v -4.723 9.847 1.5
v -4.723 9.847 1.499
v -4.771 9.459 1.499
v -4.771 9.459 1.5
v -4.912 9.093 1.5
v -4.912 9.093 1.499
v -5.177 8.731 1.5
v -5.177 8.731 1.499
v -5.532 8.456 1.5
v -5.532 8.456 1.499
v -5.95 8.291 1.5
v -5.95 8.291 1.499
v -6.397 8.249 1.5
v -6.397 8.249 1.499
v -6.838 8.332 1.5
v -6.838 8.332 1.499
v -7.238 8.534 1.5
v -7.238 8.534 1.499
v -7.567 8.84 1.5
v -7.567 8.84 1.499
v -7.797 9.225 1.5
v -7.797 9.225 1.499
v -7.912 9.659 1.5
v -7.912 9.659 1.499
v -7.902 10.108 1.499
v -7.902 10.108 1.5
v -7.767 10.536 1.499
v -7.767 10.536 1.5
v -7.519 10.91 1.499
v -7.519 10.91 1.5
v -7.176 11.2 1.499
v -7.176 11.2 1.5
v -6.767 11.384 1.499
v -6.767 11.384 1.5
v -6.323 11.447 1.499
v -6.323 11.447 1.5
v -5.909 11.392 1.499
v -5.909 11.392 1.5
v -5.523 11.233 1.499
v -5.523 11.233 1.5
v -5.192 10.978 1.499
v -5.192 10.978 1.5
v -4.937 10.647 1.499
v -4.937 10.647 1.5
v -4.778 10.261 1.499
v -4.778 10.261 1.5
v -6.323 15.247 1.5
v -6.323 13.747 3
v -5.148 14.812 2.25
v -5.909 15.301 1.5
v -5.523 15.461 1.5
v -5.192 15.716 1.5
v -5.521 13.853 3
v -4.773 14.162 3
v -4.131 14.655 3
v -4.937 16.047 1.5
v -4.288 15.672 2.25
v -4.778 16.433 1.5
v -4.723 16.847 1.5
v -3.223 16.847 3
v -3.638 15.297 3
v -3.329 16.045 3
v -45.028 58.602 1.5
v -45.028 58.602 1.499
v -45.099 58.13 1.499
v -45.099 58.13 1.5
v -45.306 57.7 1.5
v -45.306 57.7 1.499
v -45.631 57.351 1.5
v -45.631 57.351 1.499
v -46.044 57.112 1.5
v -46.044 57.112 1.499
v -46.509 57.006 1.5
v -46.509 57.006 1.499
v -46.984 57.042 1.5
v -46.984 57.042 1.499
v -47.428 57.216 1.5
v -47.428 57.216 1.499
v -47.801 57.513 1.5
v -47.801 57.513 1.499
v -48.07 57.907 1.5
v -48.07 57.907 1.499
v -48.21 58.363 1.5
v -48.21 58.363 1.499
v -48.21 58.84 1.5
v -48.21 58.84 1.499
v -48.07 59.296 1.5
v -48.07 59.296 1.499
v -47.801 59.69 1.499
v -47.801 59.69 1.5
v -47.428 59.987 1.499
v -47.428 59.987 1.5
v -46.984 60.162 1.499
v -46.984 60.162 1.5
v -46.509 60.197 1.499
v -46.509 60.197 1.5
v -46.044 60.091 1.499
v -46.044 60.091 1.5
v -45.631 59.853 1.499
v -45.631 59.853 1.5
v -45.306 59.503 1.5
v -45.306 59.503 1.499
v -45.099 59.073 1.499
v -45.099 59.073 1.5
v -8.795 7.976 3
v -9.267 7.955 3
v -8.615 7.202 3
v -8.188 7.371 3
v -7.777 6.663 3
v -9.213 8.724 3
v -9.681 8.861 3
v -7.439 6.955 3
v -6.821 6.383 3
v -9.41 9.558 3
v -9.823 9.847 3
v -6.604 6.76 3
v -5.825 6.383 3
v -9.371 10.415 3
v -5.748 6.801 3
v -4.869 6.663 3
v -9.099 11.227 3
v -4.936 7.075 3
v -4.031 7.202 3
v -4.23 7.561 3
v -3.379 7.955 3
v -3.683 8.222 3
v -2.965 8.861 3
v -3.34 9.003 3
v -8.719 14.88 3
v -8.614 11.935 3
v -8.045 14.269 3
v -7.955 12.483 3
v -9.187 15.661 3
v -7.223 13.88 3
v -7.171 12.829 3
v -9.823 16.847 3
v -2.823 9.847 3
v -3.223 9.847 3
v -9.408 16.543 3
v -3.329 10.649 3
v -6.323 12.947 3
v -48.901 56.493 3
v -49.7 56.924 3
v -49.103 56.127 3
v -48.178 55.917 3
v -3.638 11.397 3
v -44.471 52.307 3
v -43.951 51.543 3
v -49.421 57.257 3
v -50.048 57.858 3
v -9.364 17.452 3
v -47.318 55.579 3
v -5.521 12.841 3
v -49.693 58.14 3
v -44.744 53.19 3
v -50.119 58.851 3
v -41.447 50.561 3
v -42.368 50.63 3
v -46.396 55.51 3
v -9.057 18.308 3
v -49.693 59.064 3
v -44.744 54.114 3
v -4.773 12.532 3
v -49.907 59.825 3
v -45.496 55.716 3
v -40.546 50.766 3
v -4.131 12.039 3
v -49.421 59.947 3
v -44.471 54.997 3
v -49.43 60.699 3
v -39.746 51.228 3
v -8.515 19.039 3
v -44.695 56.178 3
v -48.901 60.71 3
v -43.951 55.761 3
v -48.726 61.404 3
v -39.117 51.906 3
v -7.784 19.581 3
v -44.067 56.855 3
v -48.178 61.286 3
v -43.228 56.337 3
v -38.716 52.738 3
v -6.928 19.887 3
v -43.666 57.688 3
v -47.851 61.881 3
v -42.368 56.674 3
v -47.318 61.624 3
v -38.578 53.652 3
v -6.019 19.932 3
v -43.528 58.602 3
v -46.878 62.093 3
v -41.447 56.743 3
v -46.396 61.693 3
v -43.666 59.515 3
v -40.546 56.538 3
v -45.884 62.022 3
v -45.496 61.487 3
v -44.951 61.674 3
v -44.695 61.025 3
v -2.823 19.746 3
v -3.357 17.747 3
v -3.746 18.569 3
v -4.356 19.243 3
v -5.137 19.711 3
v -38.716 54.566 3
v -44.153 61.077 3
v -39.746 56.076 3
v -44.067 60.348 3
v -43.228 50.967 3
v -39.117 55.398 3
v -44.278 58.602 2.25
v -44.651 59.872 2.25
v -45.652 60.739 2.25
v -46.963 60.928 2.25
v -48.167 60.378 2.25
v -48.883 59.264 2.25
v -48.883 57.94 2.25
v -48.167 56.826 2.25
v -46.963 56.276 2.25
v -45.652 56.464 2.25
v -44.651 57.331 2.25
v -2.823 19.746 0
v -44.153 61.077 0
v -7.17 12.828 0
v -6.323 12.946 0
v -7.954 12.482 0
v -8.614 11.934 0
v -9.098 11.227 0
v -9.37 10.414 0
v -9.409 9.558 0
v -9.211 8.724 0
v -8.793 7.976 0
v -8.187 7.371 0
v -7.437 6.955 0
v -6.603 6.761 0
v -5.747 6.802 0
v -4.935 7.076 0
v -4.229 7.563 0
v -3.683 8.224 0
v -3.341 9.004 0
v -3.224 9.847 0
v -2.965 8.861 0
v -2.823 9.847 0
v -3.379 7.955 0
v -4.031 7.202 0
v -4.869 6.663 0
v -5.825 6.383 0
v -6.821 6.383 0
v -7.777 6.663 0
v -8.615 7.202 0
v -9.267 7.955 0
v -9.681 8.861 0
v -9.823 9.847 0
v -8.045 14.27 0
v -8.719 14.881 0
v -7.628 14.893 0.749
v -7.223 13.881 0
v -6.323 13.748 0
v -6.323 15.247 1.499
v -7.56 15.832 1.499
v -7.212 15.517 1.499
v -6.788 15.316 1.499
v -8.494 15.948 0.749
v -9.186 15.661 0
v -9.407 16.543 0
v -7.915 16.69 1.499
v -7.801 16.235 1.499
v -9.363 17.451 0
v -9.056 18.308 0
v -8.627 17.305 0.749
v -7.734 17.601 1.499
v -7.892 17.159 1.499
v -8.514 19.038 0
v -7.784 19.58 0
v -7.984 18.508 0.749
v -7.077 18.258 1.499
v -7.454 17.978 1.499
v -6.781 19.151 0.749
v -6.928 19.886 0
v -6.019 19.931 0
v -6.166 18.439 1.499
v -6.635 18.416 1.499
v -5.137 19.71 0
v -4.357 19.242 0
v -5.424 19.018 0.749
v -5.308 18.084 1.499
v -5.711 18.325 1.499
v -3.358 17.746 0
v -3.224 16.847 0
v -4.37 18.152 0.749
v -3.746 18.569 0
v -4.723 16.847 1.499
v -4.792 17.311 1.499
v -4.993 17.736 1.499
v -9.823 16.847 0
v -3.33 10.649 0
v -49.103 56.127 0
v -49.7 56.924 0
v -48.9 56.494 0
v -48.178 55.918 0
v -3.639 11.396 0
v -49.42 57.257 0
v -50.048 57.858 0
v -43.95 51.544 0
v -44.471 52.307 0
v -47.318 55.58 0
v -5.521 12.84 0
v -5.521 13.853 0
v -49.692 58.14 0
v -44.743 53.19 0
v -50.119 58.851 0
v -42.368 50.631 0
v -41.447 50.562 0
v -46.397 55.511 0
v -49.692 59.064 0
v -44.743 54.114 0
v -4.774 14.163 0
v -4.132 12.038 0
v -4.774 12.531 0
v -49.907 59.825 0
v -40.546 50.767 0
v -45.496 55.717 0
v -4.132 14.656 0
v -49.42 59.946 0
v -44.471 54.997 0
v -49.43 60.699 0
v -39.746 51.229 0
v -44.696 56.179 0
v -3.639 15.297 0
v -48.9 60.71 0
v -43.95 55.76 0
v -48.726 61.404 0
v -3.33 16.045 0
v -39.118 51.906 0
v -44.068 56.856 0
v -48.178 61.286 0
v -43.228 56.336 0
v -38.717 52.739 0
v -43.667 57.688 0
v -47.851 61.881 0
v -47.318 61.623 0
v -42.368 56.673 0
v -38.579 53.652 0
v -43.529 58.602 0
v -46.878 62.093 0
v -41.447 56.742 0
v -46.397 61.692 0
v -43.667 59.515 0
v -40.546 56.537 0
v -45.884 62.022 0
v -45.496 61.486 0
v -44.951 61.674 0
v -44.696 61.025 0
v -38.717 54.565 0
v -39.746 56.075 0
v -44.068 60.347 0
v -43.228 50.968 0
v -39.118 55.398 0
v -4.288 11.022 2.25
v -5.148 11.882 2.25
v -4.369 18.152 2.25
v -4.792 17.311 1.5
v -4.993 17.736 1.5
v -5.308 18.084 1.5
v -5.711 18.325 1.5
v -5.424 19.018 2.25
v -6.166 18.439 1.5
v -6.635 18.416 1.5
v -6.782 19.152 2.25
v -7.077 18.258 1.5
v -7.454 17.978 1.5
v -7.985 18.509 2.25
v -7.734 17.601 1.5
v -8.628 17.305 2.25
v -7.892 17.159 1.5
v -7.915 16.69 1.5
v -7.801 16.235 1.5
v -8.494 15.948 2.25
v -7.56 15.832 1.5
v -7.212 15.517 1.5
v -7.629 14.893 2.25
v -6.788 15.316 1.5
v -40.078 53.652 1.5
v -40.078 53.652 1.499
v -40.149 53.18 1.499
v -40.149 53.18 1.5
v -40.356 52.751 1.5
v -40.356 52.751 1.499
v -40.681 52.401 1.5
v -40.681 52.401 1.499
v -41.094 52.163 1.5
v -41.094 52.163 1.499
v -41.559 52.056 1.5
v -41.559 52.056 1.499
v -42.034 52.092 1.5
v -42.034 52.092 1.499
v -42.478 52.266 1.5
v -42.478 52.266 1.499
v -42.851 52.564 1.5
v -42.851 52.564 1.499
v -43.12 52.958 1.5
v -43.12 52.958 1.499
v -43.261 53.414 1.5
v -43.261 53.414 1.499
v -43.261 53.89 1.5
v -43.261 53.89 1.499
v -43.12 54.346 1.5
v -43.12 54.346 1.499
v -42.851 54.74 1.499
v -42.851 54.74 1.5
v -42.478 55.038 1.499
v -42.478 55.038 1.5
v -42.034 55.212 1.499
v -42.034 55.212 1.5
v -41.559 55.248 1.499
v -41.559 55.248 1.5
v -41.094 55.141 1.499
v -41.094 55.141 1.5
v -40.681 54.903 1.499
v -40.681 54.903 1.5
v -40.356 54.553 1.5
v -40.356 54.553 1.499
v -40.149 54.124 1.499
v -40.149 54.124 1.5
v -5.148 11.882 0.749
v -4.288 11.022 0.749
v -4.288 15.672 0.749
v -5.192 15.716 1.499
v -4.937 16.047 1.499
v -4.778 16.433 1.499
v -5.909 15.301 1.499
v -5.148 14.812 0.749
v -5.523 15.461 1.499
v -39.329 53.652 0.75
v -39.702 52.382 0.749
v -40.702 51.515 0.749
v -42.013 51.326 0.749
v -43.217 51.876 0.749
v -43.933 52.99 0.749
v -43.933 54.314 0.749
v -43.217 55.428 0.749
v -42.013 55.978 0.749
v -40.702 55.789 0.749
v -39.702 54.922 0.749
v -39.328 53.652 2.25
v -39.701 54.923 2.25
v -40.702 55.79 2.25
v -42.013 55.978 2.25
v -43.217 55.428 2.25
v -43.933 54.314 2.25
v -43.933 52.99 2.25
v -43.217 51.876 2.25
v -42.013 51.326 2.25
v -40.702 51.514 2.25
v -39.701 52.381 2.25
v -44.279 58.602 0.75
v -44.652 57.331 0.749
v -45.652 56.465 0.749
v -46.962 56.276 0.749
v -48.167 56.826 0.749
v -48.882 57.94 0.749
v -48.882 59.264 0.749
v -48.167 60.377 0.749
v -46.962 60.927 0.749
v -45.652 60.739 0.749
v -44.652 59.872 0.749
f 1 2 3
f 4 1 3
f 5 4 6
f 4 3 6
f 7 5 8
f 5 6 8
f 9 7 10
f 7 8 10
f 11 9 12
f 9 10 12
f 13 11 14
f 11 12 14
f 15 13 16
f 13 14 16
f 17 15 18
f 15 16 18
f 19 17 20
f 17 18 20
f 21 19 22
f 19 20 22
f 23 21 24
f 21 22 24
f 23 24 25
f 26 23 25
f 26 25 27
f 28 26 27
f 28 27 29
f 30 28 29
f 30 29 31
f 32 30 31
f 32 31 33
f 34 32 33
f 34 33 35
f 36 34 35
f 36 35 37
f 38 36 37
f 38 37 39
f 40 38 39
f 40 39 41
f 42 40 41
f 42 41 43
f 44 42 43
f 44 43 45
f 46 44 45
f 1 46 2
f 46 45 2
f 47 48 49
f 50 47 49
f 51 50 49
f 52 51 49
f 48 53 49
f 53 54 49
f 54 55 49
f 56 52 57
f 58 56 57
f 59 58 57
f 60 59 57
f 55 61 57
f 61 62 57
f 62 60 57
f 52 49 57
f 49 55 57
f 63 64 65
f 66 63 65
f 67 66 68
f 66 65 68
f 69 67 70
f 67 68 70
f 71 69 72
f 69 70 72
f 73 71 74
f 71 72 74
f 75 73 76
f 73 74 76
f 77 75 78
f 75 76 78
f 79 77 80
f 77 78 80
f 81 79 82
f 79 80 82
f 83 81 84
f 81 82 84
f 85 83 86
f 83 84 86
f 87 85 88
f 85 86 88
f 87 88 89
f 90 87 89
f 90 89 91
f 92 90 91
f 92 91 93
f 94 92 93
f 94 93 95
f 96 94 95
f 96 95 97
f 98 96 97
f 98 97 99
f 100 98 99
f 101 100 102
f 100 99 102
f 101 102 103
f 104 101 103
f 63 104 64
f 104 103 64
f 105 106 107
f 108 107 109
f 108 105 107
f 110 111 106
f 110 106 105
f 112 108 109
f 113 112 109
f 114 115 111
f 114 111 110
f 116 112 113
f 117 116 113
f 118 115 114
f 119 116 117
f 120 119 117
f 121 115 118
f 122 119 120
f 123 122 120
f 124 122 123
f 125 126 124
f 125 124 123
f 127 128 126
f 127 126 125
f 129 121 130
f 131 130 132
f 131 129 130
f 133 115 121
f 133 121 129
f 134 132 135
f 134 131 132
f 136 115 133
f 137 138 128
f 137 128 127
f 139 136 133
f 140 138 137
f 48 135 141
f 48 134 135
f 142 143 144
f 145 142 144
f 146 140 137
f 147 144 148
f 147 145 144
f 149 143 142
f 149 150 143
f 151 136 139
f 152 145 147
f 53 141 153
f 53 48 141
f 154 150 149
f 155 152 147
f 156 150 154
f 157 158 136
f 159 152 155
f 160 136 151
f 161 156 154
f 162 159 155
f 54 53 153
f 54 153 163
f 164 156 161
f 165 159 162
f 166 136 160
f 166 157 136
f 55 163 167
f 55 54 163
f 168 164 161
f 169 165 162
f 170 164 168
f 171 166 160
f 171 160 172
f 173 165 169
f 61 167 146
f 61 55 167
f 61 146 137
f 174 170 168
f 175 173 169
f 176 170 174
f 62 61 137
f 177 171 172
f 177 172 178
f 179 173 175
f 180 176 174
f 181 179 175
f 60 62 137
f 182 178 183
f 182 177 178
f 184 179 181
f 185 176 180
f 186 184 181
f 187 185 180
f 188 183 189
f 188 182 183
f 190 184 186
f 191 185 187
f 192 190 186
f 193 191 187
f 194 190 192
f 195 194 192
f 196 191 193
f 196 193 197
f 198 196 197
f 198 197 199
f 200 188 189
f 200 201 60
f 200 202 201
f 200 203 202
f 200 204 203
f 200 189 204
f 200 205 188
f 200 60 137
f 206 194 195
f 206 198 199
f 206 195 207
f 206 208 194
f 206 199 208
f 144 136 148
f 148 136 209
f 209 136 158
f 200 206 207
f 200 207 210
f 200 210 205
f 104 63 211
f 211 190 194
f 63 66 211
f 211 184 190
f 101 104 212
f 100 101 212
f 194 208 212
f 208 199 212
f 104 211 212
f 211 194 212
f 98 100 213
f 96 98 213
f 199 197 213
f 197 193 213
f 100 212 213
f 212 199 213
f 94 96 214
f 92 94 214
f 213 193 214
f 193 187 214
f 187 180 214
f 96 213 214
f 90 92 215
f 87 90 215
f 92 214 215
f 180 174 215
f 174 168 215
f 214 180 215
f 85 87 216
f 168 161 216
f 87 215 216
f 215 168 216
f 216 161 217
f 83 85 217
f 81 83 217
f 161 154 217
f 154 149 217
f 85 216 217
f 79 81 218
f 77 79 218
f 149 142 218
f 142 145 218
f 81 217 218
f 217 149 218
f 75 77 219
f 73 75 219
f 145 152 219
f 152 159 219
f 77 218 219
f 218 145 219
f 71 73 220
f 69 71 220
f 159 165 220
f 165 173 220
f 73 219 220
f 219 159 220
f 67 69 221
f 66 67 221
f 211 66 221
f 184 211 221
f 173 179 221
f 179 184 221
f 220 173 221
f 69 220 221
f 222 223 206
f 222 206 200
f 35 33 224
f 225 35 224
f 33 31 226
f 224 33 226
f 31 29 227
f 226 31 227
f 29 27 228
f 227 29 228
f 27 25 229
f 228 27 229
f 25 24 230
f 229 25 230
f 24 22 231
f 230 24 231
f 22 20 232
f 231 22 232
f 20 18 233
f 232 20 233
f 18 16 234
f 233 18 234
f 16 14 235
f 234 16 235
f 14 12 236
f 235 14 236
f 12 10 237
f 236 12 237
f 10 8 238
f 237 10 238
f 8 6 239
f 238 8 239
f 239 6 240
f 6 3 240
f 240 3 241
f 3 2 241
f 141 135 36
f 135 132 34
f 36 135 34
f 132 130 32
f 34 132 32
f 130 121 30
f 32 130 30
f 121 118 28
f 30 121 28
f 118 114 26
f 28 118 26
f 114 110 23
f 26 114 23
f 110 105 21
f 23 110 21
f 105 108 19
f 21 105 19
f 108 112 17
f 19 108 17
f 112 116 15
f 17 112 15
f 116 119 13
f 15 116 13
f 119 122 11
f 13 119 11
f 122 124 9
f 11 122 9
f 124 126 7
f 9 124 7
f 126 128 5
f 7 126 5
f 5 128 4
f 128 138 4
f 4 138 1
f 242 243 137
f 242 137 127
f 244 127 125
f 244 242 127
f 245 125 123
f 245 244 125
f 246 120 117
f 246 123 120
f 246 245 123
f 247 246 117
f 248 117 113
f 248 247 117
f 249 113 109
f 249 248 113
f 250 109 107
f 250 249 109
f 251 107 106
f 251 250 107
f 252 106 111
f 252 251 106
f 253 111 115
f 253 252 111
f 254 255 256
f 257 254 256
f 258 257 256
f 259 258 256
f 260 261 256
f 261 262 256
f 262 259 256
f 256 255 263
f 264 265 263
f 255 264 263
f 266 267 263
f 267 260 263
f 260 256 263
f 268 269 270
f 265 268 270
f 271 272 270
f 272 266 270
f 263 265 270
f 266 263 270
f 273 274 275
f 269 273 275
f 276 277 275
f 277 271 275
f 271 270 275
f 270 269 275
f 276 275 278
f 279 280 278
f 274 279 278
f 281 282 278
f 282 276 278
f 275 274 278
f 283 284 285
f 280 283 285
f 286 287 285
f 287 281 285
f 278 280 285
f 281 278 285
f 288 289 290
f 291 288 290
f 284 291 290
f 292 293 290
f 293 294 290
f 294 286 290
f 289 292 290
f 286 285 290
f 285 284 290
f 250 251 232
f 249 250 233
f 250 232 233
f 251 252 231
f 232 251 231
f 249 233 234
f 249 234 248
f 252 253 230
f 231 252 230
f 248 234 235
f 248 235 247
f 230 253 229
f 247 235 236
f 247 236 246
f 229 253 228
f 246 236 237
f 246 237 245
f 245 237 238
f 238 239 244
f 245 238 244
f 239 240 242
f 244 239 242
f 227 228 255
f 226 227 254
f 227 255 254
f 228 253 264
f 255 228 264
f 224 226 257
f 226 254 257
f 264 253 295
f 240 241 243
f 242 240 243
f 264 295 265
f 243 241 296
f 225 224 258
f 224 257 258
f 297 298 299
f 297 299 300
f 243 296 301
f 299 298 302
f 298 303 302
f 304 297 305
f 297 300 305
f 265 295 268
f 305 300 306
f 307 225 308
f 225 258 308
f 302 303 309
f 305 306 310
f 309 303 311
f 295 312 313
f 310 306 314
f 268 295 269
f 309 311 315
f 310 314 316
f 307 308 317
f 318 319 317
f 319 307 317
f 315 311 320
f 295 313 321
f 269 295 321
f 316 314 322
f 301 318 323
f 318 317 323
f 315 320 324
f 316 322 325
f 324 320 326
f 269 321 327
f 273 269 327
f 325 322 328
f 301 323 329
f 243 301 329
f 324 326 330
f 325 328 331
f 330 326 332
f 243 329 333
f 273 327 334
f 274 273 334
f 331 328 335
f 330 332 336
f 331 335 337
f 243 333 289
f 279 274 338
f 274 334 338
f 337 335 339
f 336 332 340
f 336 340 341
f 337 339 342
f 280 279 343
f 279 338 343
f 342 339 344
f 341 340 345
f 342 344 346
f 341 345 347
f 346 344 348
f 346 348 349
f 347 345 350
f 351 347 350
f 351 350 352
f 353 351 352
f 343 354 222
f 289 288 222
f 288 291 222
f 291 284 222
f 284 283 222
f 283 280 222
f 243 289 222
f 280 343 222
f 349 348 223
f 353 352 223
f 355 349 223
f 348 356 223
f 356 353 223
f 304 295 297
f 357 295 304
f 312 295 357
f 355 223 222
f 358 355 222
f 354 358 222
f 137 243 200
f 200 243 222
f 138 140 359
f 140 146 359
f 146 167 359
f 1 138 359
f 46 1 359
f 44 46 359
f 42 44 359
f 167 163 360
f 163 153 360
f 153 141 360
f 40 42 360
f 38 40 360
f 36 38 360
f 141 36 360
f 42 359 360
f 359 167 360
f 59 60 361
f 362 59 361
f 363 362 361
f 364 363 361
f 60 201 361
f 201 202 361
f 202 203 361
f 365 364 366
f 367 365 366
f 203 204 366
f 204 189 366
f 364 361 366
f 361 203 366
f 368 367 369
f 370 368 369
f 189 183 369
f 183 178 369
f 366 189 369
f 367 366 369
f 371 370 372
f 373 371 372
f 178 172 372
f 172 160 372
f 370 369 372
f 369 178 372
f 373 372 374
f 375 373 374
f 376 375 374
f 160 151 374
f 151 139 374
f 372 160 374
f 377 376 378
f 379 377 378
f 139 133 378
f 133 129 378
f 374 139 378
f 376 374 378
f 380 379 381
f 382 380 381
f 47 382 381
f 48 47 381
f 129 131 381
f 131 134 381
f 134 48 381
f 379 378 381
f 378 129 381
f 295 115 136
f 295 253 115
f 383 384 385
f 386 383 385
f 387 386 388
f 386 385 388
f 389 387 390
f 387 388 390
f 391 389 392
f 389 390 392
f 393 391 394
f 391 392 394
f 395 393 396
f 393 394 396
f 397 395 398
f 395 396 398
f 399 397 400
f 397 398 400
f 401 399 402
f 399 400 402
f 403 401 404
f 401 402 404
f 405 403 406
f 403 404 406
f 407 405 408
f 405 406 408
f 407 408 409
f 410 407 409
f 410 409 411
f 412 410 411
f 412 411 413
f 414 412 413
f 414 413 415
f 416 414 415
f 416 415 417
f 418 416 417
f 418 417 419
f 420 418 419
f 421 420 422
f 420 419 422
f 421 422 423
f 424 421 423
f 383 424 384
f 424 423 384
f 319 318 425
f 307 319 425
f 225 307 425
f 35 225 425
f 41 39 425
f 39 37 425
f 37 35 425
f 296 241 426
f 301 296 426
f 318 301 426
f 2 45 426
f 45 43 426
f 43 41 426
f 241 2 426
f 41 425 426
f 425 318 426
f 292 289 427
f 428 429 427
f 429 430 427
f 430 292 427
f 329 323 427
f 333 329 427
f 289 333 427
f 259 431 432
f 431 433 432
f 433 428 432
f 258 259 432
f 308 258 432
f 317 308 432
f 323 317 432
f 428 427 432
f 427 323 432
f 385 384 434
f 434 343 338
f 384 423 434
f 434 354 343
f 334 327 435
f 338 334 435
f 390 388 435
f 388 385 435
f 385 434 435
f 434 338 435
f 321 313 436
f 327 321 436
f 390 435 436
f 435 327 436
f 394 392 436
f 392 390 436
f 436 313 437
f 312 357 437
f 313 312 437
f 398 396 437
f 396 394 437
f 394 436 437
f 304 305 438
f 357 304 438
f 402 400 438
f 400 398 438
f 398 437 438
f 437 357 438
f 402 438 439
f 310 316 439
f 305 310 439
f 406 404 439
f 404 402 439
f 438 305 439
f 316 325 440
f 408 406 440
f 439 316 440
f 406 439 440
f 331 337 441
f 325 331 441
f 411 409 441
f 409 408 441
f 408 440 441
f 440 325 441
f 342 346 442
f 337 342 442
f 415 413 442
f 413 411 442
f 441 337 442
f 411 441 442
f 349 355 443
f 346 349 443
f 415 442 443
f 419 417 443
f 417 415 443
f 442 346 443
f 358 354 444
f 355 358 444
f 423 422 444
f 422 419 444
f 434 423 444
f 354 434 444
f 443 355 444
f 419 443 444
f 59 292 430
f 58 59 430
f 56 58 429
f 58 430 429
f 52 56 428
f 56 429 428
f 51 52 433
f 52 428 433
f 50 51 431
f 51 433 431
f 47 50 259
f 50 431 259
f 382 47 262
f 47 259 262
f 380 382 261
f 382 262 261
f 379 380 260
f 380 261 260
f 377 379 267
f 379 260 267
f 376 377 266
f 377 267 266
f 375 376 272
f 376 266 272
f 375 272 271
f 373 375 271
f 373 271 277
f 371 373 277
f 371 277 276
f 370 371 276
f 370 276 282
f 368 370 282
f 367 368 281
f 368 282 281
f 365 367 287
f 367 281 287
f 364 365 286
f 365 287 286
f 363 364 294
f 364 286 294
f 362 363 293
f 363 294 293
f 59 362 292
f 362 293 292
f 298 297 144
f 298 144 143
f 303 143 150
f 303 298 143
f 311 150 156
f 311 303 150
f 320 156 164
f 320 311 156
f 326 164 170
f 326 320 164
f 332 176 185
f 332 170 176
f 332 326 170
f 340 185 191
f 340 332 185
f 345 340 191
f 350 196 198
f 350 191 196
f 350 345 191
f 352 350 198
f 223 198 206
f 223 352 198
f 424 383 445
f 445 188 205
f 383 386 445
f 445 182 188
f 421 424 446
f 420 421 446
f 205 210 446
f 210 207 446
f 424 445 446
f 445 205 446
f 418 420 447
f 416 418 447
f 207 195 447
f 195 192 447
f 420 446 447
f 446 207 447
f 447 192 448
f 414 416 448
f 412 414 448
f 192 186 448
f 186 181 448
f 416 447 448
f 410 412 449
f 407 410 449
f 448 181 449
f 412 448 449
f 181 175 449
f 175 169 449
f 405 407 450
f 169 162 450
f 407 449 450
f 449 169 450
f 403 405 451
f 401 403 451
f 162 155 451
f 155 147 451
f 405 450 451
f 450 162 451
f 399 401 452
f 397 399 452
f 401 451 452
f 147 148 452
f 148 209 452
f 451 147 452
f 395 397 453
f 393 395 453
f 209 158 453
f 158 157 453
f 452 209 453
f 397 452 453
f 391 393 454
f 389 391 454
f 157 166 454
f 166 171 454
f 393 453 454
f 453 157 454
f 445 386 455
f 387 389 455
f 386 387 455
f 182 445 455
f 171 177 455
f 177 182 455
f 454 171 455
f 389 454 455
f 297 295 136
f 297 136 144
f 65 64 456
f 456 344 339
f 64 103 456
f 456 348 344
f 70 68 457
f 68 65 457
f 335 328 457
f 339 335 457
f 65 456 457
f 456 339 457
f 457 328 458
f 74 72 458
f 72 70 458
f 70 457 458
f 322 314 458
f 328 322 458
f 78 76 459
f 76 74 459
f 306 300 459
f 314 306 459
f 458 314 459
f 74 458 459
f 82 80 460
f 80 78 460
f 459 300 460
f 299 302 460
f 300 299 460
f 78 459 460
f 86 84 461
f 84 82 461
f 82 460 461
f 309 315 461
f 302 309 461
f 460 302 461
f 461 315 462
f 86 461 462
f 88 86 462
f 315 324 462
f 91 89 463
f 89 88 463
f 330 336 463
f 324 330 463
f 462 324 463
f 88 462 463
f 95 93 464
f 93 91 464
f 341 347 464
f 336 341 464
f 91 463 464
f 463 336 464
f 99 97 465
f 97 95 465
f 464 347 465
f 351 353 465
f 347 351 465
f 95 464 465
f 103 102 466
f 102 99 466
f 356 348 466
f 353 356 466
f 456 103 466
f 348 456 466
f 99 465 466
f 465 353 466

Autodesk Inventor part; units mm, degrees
ref_plane "YZ Plane" through (0, 0, 0) normal (1, 0, 0) x (0, 1, 0)
ref_plane "XZ Plane" through (0, 0, 0) normal (0, 1, 0) x (-1, 0, 0)
ref_plane "XY Plane" through (0, 0, 0) normal (0, 0, 1) x (1, 0, 0)
sketch "Эскиз1" plane through (0, 0, 0) normal (0, 0, 1) x (1, 0, 0)
  circle A0 centre (-6.3231, 9.8469) radius 1.6
  circle A1 centre (-6.3231, 16.8469) radius 1.6
  line L0 (-6.3231, 9.8469) -> (-6.3231, 16.8469)
  circle A2 centre (-6.3231, 16.8469) radius 3.5
  circle A3 centre (-6.3231, 9.8469) radius 3.5
  line L1 (-9.8231, 9.8469) -> (-9.8231, 16.8469)
  line L2 (-2.8231, 9.8469) -> (-2.8231, 16.8469)
  line L3 (-9.8231, 16.8469) -> (-41.6784, 48.7022)
  line L4 (-9.8231, 16.8469) -> (40.1769, 16.8469) construction
  line L5 (-36.7287, 53.652) -> (-41.6784, 48.7022)
  line L6 (-39.2035, 51.1771) -> (-41.6784, 53.652) construction
  circle A4 centre (-41.6784, 53.652) radius 3.5
  line L7 (-36.7287, 53.652) -> (-2.8231, 19.7464)
  line L8 (-2.8231, 19.7464) -> (-2.8231, 16.8469)
  circle A5 centre (-41.6784, 53.652) radius 1.6
  line L9 (-41.6784, 53.652) -> (-46.6281, 58.6017) construction
  circle A6 centre (-46.6281, 58.6017) radius 3.5
  circle A7 centre (-46.6281, 58.6017) radius 1.6
  line L10 (-41.6784, 48.7022) -> (-49.103, 56.1268)
  line L11 (-36.7287, 53.652) -> (-44.1533, 61.0766)
  point P0 (0, 0)
  dimension "d0" = 3.2
  dimension "d1" = 3.2
  dimension "d2" = 7
  dimension "d3" = 7
  dimension "d4" = 7
  dimension "d8" = 135
  dimension "d9" = 45.0502
  dimension "d10" = 3.5
  dimension "d11" = 7
  dimension "d12" = 3.2
  dimension "d13" = 7
  dimension "d14" = 3.2
extrude "Выдавливание1" add sketch "Эскиз1" along normal blind 3
chamfer "Фаска1" distance 1.5 angle 45 4 edges at (-7.9231, 9.8469, 3) (-7.9231, 16.8469, 3) (-43.2784, 53.652, 3) (-48.2281, 58.6017, 3)
chamfer "Фаска2" distance 1.5 angle 45 4 edges at (-7.9231, 9.8469, 0) (-7.9231, 16.8469, 0) (-43.2784, 53.652, 0) (-48.2281, 58.6017, 0)
properties part number "каркас1"
